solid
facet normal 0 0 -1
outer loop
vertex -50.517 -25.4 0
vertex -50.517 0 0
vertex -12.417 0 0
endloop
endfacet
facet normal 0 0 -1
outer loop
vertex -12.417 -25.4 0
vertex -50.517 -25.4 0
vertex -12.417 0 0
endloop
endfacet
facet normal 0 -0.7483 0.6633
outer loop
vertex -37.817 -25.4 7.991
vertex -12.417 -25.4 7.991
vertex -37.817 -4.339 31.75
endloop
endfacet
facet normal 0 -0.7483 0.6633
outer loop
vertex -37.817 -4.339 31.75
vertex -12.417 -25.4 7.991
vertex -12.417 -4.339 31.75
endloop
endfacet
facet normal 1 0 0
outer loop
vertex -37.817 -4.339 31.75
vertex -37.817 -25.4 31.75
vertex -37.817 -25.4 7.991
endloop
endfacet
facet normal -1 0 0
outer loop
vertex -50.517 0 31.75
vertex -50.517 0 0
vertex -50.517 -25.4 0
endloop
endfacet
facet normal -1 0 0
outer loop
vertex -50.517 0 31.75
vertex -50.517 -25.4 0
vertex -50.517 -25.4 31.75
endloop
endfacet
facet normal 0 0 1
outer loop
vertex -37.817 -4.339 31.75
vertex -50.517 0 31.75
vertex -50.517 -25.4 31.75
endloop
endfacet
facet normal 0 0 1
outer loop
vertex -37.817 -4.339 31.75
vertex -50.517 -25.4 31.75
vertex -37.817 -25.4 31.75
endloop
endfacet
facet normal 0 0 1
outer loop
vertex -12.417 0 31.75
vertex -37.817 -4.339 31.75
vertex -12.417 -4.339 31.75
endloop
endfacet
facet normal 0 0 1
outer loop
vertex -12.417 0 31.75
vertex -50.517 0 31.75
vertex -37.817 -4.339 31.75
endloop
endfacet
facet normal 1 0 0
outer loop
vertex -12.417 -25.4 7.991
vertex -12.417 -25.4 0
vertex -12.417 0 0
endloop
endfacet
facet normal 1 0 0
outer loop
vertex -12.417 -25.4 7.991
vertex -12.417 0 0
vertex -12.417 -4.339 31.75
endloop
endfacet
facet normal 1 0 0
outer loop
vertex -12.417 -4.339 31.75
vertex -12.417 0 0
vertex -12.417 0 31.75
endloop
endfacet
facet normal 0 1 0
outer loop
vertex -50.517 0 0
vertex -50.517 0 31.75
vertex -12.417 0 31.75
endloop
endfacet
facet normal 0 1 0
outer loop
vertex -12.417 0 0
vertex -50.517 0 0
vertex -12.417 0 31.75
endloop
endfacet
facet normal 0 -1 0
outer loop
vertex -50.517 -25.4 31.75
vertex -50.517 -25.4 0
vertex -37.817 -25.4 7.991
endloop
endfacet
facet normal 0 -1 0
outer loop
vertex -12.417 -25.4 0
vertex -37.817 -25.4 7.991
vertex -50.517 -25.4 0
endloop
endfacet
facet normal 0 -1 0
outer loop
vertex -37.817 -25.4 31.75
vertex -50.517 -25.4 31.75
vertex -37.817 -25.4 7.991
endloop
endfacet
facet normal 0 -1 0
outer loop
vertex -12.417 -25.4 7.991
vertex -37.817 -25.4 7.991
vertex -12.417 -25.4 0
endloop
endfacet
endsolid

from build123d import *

# Parameters (mm, degrees)
F0_W     = 38.1
F0_H     = 31.75
F1_DEPTH = 25.4
F4_DEPTH = 25.4


# Not quite as in the source:
# - a feature of the source that left no trace in its solid (it failed there, or was rolled back) is left out


with BuildPart() as f1:
    # F0 (on Front) → F1 (new body)
    with BuildSketch(Plane.XZ):
        with Locations((-31.4665150195, 15.875)):
            Rectangle(F0_W, F0_H)
    extrude(amount=F1_DEPTH)

    # F2 (on face) → F4 (cut)
    with BuildSketch(Plane.YZ.offset(-12.4165150195)):
        Polygon((-25.4, 7.9906463393), (-4.3392399561, 31.75), (-25.4, 31.75), align=None)
    extrude(amount=-F4_DEPTH, mode=Mode.SUBTRACT)


solid = f1.part
